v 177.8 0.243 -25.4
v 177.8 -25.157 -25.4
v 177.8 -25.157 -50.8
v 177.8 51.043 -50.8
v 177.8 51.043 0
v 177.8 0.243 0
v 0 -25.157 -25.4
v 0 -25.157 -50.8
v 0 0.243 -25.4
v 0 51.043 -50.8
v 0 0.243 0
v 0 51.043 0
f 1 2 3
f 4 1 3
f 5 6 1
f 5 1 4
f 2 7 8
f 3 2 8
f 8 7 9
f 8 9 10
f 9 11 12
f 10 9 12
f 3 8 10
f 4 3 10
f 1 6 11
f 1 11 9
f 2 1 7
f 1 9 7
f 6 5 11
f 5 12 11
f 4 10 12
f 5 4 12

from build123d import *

# Parameters (mm, degrees)
F1_DEPTH = 25.4
F2_DEPTH = 152.4


with BuildPart() as f1:
    # F0 (on Right) → F1 (new body)
    with BuildSketch(Plane.YZ):
        Polygon((51.043449, 0), (0.243449, 0), (0.243449, -25.4), (-25.156551, -25.4), (-25.156551, -50.8), (51.043449, -50.8), align=None)
    extrude(amount=F1_DEPTH)

    # F1_face (on face) → F2 (join)
    with BuildSketch(Plane(origin=(25.4, 18.023449, -27.94), x_dir=(0, 1, 0), z_dir=(1, 0, 0))):
        Polygon((33.02, -22.86), (33.02, 27.94), (-17.78, 27.94), (-17.78, 2.54), (-43.18, 2.54), (-43.18, -22.86), align=None)
    extrude(amount=F2_DEPTH)


solid = f1.part
